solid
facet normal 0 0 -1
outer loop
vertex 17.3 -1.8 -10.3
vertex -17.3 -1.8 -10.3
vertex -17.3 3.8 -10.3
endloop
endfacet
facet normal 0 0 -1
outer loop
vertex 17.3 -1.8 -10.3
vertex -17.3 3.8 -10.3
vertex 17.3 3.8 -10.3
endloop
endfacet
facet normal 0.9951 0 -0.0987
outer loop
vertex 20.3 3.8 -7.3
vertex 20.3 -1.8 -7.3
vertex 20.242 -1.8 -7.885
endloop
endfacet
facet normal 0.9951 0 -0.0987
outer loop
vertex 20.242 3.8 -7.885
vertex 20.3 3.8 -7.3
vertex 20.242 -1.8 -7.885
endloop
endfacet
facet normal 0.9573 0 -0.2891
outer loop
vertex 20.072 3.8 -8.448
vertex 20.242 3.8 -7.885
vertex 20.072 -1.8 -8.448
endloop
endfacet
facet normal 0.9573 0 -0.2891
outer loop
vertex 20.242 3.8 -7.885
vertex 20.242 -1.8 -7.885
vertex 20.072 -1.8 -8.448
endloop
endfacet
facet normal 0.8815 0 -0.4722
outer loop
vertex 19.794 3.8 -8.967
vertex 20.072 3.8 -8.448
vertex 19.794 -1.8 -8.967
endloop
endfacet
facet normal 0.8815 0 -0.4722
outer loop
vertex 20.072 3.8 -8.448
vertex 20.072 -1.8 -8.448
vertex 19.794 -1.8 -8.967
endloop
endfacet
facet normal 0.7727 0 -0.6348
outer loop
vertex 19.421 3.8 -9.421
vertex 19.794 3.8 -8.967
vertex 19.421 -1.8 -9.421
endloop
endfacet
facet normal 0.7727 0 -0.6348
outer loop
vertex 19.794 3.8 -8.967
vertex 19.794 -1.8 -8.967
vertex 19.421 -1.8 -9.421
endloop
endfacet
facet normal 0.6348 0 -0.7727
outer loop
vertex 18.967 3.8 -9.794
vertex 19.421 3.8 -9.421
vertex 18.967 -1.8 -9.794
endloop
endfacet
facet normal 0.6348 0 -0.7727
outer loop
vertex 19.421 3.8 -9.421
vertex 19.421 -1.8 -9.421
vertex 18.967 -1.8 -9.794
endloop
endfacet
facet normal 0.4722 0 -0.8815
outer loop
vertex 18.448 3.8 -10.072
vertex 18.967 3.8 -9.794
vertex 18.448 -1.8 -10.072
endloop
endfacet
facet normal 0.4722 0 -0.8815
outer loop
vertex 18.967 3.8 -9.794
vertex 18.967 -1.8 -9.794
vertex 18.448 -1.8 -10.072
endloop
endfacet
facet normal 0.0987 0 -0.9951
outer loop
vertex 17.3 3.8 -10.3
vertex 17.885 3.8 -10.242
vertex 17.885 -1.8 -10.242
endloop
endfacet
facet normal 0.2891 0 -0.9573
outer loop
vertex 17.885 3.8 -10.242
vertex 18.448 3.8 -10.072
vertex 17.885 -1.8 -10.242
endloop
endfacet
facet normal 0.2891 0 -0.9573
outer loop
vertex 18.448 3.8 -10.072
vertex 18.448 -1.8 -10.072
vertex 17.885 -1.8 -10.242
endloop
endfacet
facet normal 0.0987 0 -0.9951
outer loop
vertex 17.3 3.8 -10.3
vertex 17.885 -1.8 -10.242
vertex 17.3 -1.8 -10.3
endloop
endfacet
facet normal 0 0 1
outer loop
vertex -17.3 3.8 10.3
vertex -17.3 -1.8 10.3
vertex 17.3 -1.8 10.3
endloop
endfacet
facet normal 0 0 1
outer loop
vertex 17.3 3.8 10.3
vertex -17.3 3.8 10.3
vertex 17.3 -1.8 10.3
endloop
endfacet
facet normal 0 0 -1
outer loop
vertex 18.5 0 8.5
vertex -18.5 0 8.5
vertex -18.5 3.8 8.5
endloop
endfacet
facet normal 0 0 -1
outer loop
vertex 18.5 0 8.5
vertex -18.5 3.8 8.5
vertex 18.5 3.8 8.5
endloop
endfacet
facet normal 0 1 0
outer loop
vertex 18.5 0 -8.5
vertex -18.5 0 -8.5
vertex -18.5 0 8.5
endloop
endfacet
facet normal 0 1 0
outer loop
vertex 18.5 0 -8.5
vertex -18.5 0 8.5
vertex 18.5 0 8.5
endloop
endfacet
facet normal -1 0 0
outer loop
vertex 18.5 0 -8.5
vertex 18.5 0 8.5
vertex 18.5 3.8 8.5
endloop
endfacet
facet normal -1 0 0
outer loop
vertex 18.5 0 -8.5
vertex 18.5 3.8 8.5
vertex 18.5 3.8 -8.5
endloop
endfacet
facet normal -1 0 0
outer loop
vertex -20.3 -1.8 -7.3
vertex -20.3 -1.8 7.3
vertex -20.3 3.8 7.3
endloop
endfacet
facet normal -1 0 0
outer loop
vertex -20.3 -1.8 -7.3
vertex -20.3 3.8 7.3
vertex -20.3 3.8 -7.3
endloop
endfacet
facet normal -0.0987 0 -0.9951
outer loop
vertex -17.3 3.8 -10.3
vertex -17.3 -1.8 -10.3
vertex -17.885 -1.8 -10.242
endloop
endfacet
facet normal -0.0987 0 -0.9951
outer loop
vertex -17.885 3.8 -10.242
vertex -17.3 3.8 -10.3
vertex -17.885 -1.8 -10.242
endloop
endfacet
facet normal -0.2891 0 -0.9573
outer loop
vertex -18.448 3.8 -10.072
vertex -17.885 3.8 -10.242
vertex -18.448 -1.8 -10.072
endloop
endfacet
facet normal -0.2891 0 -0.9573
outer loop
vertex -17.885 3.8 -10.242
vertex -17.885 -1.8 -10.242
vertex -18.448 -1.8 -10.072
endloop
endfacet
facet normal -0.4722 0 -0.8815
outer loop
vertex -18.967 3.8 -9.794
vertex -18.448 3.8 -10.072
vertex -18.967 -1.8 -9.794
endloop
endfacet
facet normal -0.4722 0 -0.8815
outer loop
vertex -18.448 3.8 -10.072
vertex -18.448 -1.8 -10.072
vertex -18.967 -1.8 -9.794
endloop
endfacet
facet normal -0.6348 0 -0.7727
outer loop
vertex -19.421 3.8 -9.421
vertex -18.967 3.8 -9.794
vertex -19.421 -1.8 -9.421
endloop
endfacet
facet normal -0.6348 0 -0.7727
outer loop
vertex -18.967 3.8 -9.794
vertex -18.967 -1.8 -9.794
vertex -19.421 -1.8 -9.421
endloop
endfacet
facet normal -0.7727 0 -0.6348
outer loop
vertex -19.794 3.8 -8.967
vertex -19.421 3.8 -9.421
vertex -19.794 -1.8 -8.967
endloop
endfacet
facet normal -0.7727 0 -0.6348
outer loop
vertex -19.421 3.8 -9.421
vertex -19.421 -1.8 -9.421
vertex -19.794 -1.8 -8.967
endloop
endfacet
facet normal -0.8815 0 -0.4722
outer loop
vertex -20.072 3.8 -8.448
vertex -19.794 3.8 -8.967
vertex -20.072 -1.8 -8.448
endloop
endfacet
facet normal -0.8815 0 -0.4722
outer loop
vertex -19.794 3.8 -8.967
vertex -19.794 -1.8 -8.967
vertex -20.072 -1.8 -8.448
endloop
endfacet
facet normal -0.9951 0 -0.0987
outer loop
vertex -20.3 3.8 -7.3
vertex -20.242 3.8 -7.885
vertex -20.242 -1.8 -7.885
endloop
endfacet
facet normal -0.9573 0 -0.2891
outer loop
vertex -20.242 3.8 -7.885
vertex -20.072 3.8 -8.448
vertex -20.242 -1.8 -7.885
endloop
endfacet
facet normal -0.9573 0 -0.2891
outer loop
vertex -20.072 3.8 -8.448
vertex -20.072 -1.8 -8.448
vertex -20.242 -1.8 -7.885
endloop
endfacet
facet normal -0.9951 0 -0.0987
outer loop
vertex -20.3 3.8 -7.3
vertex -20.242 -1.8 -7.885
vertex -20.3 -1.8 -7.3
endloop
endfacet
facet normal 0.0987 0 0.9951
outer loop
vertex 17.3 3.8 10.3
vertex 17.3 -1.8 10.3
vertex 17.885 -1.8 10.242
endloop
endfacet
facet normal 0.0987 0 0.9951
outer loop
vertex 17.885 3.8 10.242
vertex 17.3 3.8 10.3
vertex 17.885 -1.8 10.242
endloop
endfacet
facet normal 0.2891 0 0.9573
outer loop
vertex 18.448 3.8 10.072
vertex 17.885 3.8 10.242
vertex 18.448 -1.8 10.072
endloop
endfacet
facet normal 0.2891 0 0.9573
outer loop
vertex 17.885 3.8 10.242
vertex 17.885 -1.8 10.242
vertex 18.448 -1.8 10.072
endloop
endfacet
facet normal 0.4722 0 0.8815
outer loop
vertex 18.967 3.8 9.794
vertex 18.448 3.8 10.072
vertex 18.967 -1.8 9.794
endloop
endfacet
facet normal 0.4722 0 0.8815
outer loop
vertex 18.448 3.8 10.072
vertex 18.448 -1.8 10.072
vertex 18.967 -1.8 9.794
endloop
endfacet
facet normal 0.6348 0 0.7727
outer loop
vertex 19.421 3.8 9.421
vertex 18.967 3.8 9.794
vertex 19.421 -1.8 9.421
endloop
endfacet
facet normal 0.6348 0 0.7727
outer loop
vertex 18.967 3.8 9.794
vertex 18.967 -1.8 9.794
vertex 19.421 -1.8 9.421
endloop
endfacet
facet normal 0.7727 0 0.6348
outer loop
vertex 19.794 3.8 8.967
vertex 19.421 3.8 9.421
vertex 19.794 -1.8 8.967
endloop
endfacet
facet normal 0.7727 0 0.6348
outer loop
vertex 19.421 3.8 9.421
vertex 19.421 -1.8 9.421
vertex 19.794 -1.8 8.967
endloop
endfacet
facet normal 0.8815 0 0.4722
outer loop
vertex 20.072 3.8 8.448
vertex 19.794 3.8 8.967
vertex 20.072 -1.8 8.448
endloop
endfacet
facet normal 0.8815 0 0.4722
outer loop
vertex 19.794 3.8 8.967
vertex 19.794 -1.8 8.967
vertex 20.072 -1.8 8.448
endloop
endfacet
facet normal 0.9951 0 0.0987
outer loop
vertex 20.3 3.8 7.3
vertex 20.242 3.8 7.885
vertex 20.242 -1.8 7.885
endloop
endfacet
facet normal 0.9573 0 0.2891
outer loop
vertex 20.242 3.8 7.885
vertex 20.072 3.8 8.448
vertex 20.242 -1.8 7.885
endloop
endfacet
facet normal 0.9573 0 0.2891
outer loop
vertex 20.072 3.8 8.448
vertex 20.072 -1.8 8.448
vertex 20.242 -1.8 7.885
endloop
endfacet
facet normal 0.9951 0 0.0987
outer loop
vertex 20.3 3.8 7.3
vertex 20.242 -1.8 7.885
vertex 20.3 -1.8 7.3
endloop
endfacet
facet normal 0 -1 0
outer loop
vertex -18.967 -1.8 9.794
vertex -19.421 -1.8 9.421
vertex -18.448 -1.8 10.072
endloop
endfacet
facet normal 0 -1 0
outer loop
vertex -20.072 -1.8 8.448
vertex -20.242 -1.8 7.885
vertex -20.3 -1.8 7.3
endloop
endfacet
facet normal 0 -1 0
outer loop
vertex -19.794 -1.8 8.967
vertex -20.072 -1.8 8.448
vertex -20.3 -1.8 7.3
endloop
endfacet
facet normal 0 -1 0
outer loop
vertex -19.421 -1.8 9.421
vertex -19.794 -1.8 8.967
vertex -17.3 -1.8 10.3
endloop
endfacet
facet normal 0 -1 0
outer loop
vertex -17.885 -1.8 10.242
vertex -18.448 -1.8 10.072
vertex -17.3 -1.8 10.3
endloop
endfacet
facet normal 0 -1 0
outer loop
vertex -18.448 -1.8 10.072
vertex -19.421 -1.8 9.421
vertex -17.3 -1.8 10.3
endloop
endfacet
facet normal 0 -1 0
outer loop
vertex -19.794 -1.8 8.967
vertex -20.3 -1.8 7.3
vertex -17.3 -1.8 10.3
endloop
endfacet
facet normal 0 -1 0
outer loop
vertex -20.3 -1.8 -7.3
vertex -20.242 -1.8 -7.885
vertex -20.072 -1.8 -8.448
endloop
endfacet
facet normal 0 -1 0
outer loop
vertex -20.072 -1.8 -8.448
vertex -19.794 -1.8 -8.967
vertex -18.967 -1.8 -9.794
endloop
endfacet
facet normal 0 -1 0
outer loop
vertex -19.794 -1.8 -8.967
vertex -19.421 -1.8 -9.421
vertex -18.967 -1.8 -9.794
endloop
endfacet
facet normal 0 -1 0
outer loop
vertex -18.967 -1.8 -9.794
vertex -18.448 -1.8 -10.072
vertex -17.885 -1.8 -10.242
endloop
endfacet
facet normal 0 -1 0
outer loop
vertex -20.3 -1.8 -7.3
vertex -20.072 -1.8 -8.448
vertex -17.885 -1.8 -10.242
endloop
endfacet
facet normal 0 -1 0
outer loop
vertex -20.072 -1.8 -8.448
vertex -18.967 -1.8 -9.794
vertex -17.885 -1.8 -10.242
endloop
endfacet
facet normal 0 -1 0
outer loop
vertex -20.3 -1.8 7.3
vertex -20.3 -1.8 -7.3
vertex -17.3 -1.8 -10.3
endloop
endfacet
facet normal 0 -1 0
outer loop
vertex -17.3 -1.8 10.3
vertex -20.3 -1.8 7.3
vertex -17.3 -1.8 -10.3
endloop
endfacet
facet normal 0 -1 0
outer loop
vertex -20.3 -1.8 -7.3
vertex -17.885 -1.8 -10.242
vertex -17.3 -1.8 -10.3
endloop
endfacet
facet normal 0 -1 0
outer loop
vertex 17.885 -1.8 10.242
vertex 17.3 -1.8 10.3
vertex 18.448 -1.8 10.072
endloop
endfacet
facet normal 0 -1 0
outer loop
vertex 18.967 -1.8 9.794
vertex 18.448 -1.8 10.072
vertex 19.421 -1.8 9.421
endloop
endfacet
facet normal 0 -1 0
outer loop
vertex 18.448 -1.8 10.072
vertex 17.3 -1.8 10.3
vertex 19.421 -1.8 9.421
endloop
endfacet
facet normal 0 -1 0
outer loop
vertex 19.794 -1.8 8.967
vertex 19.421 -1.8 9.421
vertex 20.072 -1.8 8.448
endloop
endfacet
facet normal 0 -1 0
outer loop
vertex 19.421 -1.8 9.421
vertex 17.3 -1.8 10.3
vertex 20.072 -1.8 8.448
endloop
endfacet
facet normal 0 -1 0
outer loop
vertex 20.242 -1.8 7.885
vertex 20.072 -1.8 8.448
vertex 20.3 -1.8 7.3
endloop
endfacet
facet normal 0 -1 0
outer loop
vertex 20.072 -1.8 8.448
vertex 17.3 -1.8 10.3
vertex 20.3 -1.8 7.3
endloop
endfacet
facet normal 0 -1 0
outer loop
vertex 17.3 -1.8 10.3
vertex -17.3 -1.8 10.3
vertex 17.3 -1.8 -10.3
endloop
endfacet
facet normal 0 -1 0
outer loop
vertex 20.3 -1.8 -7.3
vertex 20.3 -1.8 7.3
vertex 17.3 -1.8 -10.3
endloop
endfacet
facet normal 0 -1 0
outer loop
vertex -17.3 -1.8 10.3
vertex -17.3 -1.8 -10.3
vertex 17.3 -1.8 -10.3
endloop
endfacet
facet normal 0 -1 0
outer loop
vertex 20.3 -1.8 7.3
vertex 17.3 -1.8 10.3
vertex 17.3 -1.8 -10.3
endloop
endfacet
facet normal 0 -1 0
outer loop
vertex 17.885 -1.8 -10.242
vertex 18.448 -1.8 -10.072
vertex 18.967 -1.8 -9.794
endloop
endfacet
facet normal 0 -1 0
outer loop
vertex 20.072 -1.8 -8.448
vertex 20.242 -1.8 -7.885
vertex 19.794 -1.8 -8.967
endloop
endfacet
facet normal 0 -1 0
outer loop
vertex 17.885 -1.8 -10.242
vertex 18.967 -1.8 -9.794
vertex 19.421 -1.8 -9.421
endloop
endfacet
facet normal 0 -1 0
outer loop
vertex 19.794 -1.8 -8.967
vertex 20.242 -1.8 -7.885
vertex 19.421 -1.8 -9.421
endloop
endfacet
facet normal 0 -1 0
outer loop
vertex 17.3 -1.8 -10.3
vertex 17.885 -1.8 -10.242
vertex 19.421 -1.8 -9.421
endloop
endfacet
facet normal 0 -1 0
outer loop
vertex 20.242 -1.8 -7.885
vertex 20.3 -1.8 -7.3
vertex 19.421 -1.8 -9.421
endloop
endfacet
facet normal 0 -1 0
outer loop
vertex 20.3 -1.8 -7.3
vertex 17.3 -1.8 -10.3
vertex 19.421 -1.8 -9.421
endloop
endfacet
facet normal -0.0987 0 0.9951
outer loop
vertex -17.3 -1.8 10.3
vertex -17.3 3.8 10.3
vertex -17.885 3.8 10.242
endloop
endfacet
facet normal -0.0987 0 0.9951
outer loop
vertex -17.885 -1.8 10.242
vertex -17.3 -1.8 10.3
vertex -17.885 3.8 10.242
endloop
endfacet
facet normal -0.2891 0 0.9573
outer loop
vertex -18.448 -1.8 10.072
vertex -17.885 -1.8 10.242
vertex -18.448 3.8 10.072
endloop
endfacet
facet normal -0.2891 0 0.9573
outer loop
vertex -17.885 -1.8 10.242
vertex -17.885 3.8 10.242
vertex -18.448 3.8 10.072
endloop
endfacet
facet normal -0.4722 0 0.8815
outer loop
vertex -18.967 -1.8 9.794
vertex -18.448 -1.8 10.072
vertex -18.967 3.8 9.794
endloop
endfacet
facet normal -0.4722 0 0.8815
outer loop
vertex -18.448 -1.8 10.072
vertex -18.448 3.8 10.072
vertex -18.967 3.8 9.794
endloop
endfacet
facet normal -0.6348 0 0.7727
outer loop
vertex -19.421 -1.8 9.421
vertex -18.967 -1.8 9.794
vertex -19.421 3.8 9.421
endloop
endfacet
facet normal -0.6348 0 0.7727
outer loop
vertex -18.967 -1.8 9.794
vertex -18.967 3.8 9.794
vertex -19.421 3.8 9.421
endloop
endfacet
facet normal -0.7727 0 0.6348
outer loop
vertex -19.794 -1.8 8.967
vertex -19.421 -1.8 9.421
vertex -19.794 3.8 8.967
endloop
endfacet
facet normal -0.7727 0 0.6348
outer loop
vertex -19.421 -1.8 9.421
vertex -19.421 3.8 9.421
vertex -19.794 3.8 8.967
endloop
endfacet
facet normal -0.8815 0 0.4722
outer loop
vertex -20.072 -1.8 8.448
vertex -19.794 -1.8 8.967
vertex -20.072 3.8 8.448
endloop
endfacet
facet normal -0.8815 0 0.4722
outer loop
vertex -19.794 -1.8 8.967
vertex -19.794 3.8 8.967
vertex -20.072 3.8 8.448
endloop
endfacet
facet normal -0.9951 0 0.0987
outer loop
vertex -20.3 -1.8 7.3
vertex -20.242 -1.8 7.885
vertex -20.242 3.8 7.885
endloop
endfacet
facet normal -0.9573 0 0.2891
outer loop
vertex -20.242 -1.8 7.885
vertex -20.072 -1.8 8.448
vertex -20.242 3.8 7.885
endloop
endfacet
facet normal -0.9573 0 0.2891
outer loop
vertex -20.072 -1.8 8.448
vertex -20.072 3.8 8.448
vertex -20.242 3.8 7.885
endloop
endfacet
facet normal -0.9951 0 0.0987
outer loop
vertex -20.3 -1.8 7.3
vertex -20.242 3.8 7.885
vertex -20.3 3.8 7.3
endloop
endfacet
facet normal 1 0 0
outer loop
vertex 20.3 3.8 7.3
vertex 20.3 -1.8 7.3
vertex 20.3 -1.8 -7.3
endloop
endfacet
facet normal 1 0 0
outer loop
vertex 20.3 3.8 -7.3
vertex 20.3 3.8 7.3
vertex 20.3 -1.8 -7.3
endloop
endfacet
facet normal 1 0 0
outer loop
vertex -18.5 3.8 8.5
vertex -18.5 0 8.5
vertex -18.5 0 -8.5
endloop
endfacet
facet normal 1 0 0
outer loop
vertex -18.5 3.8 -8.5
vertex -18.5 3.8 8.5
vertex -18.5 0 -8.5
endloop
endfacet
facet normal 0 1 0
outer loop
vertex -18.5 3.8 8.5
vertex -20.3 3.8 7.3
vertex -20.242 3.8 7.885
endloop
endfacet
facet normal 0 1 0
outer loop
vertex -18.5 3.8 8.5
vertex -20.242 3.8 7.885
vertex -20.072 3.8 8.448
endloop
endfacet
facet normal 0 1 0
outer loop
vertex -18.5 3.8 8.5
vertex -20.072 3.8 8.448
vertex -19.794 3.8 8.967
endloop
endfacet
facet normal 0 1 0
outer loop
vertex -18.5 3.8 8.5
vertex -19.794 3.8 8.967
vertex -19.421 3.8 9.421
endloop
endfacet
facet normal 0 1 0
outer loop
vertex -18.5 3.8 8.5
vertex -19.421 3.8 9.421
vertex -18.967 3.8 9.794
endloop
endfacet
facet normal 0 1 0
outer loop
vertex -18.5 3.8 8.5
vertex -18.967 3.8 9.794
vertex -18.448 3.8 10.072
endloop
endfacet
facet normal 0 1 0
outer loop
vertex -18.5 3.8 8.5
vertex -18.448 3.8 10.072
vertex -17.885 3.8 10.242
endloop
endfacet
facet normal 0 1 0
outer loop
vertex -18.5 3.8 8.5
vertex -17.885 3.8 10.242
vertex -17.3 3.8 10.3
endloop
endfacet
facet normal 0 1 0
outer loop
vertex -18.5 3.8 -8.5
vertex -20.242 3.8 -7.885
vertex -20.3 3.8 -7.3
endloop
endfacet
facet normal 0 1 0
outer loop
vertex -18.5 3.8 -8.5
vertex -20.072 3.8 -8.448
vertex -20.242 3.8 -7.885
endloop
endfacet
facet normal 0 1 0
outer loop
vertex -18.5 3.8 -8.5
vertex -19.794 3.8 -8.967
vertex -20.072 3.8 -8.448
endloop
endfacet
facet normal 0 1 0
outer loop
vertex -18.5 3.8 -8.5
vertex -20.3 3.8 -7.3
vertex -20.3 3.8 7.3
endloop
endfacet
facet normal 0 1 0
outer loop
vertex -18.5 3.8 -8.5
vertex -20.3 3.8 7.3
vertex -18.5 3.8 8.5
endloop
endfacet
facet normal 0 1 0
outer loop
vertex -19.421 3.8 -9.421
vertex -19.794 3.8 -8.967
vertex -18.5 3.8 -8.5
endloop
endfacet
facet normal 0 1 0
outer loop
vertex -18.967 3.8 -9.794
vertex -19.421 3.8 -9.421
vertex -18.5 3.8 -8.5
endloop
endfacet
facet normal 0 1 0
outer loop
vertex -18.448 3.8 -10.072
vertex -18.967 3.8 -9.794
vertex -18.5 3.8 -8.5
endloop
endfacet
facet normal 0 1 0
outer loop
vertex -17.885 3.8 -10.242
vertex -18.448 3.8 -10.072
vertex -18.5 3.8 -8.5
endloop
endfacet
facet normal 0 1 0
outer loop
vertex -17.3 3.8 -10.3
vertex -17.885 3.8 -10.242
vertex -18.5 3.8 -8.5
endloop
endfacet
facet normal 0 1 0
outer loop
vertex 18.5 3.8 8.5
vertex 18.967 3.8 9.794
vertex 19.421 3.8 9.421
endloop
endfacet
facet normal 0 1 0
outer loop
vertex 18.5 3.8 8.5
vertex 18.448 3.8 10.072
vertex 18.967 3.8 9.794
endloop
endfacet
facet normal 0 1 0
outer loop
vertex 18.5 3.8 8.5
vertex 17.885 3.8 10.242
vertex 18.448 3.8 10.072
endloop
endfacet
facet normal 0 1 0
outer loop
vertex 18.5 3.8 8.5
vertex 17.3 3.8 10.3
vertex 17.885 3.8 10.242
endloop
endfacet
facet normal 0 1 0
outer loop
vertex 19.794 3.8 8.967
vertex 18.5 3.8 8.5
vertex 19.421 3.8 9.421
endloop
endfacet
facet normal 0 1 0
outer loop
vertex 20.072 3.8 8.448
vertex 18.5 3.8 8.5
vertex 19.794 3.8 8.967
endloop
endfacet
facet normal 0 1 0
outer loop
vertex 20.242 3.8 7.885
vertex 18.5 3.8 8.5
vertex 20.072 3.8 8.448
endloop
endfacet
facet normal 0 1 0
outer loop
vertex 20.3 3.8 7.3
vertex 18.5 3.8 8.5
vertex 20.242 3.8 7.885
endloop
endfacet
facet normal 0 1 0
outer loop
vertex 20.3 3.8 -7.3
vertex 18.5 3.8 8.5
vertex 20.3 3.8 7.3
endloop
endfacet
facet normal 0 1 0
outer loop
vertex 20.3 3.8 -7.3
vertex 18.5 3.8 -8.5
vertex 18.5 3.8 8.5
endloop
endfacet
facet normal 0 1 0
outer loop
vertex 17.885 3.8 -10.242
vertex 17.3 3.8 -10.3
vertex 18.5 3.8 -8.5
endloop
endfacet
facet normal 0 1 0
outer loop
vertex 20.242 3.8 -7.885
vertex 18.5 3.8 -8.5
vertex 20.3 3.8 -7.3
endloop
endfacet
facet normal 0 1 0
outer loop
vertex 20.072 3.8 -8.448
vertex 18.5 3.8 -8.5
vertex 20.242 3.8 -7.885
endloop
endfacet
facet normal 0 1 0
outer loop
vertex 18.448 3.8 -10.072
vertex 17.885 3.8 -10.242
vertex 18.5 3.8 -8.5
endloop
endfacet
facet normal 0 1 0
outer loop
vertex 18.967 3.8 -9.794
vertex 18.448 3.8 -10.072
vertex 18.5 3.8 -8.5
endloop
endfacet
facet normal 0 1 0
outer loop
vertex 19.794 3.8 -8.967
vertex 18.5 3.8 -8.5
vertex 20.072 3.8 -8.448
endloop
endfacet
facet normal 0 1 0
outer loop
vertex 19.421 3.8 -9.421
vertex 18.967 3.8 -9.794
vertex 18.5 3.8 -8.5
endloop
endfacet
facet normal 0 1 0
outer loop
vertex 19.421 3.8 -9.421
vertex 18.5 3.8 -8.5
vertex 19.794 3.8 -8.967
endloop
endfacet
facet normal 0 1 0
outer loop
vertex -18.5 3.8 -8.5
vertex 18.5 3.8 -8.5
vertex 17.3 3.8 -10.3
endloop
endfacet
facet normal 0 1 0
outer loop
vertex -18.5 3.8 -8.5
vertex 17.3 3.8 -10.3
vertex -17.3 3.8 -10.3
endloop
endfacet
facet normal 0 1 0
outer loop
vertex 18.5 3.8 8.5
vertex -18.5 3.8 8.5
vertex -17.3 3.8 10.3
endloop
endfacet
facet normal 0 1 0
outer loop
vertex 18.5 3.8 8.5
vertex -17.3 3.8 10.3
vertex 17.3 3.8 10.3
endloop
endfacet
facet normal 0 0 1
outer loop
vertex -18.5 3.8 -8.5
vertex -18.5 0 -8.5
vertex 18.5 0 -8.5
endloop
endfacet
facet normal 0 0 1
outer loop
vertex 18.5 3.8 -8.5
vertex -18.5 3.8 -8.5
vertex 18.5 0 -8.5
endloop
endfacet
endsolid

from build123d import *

# Parameters (mm, degrees)
CROQUIS1_W              = 37
CROQUIS1_H              = 17
SALIENTE_EXTRUIR1_DEPTH = 3.8
VACIADO1_T              = 1.8
REDONDEO2_R             = 3


with BuildPart() as part:
    # Croquis1 → Saliente-Extruir1 (new body)
    with BuildSketch(Plane(origin=(0, 0, 0), x_dir=(1, 0, 0), z_dir=(0, 1, 0))):
        Rectangle(CROQUIS1_W, CROQUIS1_H)
    extrude(amount=SALIENTE_EXTRUIR1_DEPTH)

    # Vaciado1
    vaciado1_openings = [part.faces().sort_by_distance(p)[0] for p in [
        (0, 3.8, 0),
    ]]
    offset(amount=VACIADO1_T, openings=vaciado1_openings, kind=Kind.INTERSECTION)

    # Redondeo2
    # the kernel refuses this fillet: 3 mm, written as the material it takes off along each edge
    with BuildSketch(Plane(origin=(20.3, -9.3, 10.3), x_dir=(-1, 0, 0), z_dir=(0, 1, 0)), Plane(origin=(-20.3, 11.3, 10.3), x_dir=(1, 0, 0), z_dir=(0, -1, 0)), Plane(origin=(-20.3, -9.3, -10.3), x_dir=(1, 0, 0), z_dir=(0, 1, 0)), Plane(origin=(20.3, -9.3, -10.3), x_dir=(0, 0, 1), z_dir=(0, 1, 0))) as redondeo2_piece_1:
        with BuildLine():
            CenterArc((REDONDEO2_R, -REDONDEO2_R), REDONDEO2_R, 90, 90)
            Line((0, -REDONDEO2_R), (0, 0))
            Line((0, 0), (REDONDEO2_R, 0))
        make_face()
    extrude(amount=20.6, mode=Mode.SUBTRACT)


solid = part.part
